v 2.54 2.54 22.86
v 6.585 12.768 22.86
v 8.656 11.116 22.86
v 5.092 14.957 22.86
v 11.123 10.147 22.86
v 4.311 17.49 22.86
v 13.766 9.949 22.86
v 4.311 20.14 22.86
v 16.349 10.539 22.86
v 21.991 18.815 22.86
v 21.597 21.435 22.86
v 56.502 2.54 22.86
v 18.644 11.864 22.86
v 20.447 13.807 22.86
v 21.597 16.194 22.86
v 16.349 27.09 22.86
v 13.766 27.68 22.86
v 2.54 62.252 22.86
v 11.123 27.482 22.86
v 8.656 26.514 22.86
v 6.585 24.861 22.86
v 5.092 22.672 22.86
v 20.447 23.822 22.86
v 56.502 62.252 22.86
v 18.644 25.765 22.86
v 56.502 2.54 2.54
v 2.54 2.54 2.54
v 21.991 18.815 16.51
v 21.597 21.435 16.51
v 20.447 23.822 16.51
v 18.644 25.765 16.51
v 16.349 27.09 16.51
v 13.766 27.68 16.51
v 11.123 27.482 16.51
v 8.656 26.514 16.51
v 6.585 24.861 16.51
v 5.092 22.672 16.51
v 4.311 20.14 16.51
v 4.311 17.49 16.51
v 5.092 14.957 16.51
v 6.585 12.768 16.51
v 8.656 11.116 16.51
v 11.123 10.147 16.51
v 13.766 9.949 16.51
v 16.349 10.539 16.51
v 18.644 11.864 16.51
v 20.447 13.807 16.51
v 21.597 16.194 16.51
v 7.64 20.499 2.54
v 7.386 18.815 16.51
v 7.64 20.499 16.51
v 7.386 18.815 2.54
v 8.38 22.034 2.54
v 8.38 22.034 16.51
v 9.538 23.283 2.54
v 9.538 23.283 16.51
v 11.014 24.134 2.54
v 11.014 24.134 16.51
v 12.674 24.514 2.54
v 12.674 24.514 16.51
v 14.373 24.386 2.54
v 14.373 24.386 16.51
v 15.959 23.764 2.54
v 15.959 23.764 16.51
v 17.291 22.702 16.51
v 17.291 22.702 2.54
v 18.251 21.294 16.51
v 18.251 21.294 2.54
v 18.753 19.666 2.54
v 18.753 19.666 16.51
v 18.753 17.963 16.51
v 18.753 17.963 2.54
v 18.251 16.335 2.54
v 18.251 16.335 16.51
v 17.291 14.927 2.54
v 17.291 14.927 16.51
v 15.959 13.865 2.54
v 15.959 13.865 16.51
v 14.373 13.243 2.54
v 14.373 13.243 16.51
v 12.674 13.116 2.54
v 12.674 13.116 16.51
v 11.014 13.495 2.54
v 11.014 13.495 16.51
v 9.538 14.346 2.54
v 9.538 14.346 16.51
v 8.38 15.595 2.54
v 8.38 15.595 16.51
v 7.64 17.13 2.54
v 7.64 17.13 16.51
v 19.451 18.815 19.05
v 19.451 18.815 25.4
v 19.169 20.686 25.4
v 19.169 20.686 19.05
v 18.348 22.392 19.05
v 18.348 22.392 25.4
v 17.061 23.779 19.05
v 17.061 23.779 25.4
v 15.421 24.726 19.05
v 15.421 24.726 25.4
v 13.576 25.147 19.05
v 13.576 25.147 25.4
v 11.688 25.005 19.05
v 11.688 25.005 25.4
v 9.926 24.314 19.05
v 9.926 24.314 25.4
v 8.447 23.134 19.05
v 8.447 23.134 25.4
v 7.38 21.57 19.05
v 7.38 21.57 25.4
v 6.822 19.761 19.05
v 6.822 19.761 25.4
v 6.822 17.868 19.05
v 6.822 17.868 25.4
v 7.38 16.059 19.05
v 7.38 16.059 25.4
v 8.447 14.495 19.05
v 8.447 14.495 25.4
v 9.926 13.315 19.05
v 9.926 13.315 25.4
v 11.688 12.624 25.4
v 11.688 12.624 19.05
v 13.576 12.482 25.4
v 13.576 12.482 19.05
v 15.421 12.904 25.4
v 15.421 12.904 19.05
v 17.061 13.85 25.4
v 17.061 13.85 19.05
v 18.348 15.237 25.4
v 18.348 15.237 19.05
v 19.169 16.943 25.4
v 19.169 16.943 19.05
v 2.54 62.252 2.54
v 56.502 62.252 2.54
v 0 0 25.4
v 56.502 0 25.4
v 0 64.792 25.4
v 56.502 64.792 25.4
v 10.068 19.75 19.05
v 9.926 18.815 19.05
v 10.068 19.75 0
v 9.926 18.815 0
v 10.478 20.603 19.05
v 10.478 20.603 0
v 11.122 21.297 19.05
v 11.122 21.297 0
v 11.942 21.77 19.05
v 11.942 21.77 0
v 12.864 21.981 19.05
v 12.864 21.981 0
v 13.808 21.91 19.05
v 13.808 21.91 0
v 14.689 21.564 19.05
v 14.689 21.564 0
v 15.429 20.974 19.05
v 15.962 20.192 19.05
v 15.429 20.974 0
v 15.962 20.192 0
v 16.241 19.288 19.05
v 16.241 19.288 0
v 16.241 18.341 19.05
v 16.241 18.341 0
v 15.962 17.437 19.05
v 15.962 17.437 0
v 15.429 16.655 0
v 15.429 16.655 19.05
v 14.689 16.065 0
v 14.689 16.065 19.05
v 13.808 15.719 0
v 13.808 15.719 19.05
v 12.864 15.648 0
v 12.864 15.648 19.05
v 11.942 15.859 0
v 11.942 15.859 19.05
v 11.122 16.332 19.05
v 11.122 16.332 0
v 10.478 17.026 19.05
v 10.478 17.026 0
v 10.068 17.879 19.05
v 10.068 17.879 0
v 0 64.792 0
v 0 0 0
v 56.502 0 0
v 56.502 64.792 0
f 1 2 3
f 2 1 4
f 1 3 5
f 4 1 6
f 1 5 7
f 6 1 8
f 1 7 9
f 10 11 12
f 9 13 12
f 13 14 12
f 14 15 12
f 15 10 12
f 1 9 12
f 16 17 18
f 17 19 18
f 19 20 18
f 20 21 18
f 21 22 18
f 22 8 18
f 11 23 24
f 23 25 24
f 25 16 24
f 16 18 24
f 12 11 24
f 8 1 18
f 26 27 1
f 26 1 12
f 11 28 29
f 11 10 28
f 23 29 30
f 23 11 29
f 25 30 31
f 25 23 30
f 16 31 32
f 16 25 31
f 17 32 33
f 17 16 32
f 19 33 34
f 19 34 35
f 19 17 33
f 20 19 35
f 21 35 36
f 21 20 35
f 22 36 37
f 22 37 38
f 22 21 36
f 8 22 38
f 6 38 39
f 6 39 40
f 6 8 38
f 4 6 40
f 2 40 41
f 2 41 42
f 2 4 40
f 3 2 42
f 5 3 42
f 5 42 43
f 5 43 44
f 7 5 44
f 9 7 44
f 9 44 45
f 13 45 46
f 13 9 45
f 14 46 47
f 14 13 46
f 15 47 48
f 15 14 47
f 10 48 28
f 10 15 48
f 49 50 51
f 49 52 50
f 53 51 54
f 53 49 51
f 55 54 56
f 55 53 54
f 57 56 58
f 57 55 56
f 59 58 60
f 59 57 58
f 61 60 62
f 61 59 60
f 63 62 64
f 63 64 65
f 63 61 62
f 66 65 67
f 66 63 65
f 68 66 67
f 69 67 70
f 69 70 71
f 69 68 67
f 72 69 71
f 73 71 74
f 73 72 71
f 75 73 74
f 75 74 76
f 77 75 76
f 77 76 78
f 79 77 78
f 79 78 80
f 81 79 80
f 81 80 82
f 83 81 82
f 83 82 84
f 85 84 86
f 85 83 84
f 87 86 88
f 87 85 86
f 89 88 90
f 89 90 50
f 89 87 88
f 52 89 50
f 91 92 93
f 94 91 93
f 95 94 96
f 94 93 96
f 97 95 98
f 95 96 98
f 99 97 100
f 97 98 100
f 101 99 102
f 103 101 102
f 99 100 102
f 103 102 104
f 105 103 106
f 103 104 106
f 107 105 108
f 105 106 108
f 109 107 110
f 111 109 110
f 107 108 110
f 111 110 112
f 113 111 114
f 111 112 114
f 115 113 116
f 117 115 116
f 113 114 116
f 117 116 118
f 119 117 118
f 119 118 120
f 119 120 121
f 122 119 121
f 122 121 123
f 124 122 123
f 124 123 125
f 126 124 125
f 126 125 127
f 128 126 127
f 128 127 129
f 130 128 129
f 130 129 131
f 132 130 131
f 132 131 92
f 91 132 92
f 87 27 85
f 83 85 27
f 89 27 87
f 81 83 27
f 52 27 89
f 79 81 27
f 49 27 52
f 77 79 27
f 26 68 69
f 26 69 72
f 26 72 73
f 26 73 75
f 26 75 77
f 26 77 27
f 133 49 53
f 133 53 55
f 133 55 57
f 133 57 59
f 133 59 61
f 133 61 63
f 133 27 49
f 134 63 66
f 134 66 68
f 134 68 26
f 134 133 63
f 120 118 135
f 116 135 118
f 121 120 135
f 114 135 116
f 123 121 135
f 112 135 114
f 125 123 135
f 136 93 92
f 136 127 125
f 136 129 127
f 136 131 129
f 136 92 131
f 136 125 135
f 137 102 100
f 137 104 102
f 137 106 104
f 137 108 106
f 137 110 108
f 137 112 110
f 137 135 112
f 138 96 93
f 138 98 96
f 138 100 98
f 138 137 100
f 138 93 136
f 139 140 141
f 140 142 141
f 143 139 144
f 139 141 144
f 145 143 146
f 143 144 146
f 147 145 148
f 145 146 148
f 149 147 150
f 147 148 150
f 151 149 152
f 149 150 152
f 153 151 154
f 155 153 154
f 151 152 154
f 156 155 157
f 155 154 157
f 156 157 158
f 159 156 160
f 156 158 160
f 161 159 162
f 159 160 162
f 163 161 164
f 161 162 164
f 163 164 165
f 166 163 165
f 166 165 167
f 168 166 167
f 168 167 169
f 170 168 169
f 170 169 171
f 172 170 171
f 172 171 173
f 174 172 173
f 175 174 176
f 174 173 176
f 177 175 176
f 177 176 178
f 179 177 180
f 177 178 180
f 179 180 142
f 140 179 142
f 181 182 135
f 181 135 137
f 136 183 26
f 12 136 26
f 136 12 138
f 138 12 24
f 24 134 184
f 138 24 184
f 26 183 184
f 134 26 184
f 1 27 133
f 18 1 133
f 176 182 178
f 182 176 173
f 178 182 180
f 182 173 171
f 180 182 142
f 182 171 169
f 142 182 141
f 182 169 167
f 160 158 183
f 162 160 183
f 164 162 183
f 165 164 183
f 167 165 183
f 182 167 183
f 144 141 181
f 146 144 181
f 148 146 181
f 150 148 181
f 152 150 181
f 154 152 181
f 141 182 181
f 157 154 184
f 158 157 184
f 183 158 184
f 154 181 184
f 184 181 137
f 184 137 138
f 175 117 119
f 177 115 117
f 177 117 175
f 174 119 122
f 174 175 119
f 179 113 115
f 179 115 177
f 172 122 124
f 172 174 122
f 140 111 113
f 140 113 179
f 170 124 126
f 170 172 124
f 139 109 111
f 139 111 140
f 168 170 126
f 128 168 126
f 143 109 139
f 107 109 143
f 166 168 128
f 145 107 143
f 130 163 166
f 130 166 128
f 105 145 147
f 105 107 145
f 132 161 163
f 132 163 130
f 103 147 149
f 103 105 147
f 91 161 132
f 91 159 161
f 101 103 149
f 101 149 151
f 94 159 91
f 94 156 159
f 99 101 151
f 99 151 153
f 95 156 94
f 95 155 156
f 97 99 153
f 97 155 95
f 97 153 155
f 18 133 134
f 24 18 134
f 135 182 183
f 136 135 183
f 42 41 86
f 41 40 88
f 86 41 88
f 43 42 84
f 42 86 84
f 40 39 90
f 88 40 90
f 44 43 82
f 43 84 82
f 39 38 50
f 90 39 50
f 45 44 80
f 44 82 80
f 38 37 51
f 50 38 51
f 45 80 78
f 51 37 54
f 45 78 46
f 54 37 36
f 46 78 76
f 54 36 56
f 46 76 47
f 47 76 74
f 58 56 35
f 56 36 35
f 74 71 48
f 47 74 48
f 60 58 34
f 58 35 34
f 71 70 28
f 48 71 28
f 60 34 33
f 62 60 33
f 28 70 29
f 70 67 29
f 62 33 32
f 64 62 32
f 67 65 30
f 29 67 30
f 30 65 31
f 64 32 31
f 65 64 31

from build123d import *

# Parameters (mm, degrees)
F0_W           = 56.5020628273
F0_H           = 64.7920891643
F1_DEPTH       = 25.4
F3_D           = 6.35
F3_CBORE_D     = 12.7
F3_CBORE_DEPTH = 6.35
F4_T           = -2.54


with BuildPart() as f1:
    # F0 (on Top) → F1 (new body)
    with BuildSketch(Plane.XY):
        with Locations((28.2510314137, 32.3960445821)):
            Rectangle(F0_W, F0_H)
    extrude(amount=F1_DEPTH)

    # F3 (through all)
    with Locations(Plane.XY.offset(25.4)):
        with Locations((13.101497665, 18.814554438)):
            CounterBoreHole(F3_D / 2, F3_CBORE_D / 2, F3_CBORE_DEPTH)

    # F4
    f4_openings = [f1.faces().sort_by_distance(p)[0] for p in [
        (56.502063, 32.396045, 12.7),
    ]]
    offset(amount=F4_T, openings=f4_openings, kind=Kind.INTERSECTION)


solid = f1.part
